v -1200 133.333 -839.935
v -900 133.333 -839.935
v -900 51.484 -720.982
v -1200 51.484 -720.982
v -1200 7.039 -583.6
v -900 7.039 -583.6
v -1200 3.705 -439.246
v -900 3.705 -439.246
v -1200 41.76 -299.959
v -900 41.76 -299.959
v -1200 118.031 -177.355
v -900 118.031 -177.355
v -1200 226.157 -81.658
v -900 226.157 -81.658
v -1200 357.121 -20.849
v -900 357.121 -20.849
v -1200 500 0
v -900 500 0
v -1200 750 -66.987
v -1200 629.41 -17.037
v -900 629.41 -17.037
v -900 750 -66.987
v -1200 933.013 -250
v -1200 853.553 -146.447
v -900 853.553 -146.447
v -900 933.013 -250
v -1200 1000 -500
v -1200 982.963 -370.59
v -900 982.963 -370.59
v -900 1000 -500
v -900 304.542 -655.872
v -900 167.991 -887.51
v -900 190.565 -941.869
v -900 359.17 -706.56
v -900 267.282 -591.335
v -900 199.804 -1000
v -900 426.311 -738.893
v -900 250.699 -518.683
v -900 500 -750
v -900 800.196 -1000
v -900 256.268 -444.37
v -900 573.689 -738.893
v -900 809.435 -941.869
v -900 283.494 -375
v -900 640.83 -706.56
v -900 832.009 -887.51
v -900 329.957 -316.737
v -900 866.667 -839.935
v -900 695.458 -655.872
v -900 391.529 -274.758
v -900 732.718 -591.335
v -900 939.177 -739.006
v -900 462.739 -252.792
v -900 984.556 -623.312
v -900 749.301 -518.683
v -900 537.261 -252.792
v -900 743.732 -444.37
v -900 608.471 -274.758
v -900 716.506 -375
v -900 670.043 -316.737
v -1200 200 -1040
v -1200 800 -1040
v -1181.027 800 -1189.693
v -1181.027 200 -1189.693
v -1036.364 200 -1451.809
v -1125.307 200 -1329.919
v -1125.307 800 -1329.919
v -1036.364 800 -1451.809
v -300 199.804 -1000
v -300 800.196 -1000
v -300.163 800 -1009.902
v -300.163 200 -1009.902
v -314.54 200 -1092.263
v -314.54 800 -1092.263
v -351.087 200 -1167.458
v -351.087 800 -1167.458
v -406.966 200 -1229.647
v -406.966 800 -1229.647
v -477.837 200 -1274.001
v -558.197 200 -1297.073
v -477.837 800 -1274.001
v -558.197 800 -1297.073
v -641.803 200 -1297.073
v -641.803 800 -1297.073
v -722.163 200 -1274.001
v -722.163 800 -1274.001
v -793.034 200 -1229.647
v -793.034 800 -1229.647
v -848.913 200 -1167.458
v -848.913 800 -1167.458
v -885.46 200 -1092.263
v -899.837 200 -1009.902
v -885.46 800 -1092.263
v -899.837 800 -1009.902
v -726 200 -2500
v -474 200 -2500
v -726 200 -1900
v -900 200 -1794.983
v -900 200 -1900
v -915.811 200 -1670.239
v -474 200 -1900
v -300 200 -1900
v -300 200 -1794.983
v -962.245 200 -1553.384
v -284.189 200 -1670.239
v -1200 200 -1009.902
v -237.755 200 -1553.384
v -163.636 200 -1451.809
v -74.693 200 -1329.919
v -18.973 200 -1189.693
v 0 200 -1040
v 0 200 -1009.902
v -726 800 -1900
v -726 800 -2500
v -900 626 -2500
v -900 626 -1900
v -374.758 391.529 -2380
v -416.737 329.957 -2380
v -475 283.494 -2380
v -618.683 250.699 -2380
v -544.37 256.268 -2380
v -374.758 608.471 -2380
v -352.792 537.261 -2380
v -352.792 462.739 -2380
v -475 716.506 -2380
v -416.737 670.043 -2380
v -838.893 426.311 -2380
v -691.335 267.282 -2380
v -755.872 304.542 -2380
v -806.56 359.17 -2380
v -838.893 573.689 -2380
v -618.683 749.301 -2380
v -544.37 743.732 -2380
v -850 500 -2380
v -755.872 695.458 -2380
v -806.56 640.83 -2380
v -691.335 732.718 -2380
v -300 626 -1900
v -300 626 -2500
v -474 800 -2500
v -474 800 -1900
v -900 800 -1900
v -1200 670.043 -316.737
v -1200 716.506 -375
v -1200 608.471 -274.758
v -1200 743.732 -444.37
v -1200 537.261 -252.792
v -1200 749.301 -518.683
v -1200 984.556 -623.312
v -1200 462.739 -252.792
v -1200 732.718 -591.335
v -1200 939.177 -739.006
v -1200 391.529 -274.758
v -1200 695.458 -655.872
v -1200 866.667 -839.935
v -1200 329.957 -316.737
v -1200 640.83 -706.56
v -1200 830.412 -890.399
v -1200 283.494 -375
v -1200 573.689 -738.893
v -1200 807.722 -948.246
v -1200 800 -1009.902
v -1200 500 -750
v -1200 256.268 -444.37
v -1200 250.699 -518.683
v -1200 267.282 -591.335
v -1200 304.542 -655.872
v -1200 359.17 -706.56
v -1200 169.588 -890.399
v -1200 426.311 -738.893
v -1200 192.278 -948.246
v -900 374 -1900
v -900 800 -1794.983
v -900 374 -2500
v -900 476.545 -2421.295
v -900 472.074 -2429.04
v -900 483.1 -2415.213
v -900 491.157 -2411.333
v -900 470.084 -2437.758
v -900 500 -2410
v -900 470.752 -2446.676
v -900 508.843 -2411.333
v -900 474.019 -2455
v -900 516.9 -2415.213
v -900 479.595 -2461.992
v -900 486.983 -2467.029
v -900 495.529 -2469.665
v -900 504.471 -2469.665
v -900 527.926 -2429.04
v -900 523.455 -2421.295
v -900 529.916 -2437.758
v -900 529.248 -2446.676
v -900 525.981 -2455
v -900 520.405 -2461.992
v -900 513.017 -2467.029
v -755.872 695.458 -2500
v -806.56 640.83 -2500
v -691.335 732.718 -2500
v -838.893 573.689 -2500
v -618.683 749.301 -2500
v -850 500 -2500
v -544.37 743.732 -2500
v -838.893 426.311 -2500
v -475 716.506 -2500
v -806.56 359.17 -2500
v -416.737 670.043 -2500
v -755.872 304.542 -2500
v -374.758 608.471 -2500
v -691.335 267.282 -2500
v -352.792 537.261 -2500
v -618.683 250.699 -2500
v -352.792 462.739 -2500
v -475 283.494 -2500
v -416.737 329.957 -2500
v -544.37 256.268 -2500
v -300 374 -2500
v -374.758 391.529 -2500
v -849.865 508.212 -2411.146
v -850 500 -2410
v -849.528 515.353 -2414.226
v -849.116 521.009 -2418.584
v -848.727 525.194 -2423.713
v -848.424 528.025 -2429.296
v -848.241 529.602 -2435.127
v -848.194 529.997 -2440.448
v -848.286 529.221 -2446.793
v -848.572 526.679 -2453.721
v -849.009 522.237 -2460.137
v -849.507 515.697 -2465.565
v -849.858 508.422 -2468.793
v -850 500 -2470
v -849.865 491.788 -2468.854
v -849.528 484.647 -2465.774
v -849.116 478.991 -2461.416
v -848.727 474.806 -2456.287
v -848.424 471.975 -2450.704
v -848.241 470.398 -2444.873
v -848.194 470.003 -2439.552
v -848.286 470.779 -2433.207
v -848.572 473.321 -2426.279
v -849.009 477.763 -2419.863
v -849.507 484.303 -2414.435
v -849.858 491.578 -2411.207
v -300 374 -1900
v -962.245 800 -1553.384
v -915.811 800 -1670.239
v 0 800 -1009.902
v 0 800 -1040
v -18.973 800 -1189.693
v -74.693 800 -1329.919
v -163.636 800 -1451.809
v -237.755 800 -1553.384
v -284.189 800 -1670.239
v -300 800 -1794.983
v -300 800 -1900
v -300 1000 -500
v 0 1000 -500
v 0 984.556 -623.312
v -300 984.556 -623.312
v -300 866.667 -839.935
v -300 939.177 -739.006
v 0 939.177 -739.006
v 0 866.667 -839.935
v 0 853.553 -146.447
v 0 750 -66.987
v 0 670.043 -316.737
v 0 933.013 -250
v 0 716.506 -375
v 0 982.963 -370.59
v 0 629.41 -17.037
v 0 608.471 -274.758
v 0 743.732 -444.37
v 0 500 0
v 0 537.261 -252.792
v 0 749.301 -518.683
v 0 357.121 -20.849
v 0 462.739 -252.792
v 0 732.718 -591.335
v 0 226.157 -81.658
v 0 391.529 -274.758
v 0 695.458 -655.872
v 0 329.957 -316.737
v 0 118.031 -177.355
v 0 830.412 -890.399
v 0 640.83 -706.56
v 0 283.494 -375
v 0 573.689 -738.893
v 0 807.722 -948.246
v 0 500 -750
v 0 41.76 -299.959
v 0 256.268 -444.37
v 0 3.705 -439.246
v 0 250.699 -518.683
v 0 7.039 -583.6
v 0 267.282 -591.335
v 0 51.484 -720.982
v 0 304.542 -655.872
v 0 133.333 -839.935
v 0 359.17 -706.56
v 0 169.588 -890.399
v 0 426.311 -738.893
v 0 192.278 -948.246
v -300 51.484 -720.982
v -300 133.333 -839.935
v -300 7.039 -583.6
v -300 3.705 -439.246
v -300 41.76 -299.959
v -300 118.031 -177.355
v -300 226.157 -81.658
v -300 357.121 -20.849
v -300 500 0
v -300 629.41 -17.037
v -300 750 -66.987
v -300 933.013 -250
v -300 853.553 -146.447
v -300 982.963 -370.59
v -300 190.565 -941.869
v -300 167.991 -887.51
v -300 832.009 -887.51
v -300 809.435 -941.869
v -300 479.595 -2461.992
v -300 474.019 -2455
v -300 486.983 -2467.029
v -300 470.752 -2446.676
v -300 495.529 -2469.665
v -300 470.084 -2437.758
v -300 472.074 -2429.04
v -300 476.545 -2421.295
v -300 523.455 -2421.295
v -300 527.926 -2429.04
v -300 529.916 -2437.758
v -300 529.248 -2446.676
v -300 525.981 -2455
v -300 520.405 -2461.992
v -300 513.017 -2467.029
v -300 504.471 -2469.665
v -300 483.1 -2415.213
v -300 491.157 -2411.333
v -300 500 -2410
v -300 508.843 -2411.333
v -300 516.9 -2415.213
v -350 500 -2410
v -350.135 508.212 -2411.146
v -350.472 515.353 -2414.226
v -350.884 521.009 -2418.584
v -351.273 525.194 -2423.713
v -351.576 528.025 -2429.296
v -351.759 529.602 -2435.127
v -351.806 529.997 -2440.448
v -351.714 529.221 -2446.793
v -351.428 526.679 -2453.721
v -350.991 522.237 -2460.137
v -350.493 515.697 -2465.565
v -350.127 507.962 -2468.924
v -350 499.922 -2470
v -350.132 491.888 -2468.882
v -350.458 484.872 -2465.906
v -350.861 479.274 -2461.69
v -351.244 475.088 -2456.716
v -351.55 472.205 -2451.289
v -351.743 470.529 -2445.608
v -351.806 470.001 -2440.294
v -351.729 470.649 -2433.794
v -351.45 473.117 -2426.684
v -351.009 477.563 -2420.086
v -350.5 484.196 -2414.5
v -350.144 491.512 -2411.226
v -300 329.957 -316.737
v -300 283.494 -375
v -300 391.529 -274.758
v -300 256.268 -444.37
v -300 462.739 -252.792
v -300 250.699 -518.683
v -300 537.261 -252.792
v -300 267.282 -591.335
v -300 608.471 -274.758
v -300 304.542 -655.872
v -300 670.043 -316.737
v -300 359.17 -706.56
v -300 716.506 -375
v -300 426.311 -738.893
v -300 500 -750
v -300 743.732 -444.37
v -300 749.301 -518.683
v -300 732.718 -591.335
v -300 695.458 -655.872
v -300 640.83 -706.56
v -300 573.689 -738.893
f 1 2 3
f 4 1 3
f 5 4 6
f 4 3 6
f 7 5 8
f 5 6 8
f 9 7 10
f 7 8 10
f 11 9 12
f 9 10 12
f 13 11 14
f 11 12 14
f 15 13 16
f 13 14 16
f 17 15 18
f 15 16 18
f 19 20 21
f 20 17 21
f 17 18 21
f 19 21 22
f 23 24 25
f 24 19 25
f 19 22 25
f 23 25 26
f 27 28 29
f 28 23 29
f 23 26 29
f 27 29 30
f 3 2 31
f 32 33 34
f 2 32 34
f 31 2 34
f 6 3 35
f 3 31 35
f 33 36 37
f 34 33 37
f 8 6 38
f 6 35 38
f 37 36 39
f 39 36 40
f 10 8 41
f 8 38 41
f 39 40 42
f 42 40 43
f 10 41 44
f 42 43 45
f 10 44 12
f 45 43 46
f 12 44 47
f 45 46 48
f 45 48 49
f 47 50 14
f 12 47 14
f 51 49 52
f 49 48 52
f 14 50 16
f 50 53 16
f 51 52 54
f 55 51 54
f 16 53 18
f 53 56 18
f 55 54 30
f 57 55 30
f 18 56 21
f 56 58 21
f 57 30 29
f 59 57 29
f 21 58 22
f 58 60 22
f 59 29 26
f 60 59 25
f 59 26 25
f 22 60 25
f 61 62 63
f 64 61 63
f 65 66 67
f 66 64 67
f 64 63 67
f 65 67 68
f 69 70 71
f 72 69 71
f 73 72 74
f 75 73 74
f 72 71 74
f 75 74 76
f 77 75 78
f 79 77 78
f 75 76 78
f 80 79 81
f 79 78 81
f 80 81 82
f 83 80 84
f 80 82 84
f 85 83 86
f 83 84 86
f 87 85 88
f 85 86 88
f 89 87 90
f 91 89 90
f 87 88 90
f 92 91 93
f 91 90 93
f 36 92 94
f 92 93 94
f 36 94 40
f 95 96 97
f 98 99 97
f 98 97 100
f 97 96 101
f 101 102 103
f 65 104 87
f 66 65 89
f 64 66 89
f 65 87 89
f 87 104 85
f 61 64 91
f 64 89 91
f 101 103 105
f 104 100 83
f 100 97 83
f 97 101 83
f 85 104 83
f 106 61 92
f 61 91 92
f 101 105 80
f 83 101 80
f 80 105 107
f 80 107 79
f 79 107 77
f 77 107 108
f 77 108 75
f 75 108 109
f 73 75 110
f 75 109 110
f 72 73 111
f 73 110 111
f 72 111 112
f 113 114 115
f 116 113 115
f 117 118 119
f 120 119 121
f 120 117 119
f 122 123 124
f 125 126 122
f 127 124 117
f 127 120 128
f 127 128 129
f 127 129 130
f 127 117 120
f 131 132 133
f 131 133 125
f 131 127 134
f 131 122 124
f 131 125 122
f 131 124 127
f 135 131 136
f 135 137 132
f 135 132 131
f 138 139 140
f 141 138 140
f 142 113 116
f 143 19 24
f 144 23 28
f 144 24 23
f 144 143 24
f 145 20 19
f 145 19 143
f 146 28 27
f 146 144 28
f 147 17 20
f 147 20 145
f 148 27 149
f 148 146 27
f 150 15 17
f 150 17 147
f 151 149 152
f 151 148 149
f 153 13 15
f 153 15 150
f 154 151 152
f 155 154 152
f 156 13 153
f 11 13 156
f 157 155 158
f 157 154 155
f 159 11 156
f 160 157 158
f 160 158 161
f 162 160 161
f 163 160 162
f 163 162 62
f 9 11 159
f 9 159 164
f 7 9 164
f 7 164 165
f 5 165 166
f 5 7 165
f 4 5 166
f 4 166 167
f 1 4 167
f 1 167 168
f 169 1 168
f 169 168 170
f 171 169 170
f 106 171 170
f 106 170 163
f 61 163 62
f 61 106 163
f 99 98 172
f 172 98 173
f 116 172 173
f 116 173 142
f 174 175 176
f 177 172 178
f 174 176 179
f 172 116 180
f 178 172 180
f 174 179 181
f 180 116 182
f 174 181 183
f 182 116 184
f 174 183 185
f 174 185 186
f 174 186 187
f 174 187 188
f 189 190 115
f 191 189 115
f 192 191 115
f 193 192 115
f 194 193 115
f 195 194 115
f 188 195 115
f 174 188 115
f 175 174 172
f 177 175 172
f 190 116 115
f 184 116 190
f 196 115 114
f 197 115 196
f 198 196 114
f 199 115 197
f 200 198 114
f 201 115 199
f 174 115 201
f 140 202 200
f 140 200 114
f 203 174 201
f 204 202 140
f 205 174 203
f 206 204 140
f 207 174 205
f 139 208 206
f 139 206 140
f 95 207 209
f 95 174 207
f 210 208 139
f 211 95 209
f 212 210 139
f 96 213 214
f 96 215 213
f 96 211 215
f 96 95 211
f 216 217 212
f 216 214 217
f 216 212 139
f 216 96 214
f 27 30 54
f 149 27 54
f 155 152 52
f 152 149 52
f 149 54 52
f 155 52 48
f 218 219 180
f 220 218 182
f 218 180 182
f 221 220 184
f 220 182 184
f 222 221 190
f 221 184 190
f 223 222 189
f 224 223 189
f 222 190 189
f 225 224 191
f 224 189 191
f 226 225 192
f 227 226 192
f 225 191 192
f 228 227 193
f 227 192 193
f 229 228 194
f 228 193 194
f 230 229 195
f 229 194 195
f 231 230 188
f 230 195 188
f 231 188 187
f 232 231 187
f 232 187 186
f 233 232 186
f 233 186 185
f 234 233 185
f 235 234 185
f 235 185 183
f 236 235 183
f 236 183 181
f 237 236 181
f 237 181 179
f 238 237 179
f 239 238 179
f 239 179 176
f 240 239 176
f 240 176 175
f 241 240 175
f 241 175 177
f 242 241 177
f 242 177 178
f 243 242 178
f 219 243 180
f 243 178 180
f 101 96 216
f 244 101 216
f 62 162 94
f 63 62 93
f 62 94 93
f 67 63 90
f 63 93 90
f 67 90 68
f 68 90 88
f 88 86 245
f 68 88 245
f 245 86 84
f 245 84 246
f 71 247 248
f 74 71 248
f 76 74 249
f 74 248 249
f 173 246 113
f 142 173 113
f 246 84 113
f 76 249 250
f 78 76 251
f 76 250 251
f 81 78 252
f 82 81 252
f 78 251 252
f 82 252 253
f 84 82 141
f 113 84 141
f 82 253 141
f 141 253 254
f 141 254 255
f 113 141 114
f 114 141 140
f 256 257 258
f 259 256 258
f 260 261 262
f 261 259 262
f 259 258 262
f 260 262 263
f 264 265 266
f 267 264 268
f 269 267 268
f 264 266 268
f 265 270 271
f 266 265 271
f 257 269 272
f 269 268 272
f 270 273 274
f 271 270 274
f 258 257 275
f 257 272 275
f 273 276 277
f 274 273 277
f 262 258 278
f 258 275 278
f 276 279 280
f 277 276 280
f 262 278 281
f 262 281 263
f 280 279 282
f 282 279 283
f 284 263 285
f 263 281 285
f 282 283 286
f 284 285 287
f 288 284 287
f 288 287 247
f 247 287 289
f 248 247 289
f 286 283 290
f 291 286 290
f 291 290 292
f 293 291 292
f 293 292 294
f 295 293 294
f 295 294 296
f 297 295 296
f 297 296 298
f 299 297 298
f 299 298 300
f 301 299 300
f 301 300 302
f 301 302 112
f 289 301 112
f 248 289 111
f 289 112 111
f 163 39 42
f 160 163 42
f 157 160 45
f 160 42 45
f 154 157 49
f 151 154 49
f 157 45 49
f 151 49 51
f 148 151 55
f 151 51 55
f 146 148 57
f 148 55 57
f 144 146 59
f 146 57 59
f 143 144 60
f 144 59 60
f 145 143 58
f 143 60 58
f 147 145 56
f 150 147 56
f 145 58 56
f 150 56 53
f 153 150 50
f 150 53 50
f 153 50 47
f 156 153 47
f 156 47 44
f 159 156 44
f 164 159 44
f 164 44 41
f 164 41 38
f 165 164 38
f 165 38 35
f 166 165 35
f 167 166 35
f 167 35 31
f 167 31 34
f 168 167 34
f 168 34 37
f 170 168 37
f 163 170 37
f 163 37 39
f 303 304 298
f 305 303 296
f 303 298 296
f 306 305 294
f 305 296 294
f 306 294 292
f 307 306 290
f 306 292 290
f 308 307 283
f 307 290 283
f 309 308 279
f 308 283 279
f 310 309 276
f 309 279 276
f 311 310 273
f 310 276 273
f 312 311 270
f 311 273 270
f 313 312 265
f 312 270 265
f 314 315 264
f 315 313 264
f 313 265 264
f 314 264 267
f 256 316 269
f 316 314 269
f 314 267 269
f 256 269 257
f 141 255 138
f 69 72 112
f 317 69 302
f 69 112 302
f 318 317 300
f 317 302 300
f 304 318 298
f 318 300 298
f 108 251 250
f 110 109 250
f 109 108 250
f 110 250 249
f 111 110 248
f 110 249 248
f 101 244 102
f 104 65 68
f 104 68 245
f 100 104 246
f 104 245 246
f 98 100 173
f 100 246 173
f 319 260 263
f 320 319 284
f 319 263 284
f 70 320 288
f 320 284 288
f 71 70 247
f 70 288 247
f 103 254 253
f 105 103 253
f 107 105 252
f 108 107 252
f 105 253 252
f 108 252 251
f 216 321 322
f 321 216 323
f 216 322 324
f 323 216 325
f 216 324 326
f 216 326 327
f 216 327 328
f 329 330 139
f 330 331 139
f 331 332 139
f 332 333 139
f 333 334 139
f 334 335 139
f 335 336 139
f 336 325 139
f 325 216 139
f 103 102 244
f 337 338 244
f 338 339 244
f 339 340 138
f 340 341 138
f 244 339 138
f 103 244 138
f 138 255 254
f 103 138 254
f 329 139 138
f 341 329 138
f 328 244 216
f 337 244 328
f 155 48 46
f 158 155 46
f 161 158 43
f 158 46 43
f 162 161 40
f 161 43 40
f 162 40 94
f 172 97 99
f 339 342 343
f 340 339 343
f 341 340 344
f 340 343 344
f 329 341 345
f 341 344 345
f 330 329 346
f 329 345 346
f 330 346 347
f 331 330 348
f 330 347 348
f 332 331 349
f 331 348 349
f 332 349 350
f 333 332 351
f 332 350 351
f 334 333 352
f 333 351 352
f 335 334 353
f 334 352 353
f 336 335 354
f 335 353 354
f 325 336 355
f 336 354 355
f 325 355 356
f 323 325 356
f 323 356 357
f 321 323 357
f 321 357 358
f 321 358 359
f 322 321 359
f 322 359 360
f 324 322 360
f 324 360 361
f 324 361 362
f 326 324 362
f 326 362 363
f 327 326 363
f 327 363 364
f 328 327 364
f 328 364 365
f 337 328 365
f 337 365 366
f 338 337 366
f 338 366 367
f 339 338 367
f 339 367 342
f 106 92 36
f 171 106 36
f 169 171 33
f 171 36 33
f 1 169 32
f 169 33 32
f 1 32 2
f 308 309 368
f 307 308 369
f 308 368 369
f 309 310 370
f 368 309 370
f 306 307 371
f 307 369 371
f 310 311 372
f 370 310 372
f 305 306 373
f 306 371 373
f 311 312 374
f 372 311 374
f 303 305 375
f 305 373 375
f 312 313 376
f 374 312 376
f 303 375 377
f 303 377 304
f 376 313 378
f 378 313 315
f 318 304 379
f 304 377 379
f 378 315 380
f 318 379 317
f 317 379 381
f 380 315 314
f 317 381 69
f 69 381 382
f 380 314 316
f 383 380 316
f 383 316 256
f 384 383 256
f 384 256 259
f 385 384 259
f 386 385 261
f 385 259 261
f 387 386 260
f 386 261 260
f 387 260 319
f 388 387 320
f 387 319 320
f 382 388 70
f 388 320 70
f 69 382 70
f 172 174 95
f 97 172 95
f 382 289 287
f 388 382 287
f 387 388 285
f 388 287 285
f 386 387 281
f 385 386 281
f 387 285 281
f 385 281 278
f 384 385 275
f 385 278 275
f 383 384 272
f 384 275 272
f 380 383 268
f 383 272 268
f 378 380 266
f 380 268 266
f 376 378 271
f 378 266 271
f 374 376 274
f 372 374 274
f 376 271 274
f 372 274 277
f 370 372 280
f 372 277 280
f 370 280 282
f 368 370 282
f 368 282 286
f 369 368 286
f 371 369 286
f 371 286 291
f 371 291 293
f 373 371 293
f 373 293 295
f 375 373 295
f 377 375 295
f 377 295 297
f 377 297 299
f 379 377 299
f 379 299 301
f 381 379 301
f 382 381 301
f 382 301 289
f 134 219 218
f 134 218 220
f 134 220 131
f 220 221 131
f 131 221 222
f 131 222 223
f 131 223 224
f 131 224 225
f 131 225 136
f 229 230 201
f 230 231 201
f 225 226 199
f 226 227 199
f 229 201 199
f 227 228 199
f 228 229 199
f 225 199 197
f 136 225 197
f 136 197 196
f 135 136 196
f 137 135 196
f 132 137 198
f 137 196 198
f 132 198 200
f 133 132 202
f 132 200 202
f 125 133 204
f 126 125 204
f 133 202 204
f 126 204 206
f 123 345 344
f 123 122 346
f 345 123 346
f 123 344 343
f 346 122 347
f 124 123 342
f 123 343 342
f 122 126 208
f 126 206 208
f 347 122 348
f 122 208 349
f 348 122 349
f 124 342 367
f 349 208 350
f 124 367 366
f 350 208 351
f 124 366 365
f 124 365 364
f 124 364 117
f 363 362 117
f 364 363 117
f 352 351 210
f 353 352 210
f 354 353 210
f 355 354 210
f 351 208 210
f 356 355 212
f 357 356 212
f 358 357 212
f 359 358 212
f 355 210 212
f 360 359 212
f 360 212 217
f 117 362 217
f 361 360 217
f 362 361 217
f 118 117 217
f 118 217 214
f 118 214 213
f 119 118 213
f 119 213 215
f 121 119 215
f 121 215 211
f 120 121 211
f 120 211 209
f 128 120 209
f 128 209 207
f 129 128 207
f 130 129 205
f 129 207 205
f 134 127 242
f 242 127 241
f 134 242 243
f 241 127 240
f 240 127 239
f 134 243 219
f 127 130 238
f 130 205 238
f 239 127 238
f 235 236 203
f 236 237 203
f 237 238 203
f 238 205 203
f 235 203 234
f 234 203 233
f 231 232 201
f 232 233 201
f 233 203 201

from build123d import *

# Parameters (mm, degrees)
SKETCH1_W           = 1200
SKETCH1_H           = 2500
BOSS_EXTRUDE1_DEPTH = 1000
CUT_EXTRUDE1_DEPTH  = 1000
CUT_EXTRUDE4_DEPTH  = 2948.880594597
CUT_EXTRUDE6_DEPTH  = 600
SKETCH6_R           = 250
CUT_EXTRUDE7_DEPTH  = 120
SKETCH7_R           = 30
CUT_EXTRUDE9_DEPTH  = 2840.013913347
SKETCH8_R           = 250
CUT_EXTRUDE10_DEPTH = 2948.880594722


with BuildPart() as part:
    # Sketch1 → Boss-Extrude1 (new body)
    with BuildSketch(Plane(origin=(0, 0, 0), x_dir=(1, 0, 0), z_dir=(0, 1, 0))):
        with Locations((-600, 1250)):
            Rectangle(SKETCH1_W, SKETCH1_H)
    extrude(amount=BOSS_EXTRUDE1_DEPTH)

    # Sketch2 → Cut-Extrude1 (cut)
    with BuildSketch(Plane(origin=(0, 1000, 0), x_dir=(1, 0, 0), z_dir=(0, 1, 0))):
        with BuildLine():
            Line((-900, 1794.983443527), (-900, 2500))
            Line((-900, 2500), (-1200, 2500))
            Line((-1200, 2500), (-1200, 1040))
            ThreePointArc((-1200, 1040), (-1157.592226371, 1261.564683763), (-1036.363636364, 1451.809151015))
            ThreePointArc((-1036.363636364, 1451.809151015), (-935.339811358, 1610.346207058), (-900, 1794.983443527))
        make_face()
        with BuildLine():
            Line((0, 2500), (-300, 2500))
            Line((-300, 2500), (-300, 1794.983443527))
            ThreePointArc((-300, 1794.983443527), (-264.660188642, 1610.346207058), (-163.636363636, 1451.809151015))
            ThreePointArc((-163.636363636, 1451.809151015), (-42.407773629, 1261.564683763), (0, 1040))
            Line((0, 1040), (0, 2500))
        make_face()
        with BuildLine():
            Line((-600, 0), (-600, 440))
            ThreePointArc((-600, 440), (-755.291427062, 460.444504227), (-900, 520.384757729))
            Line((-900, 520.384757729), (-900, 0))
            Line((-900, 0), (-600, 0))
        make_face()
        with BuildLine():
            Line((-600, 440), (-600, 700))
            ThreePointArc((-600, 700), (-812.132034356, 787.867965644), (-900, 1000))
            Line((-900, 1000), (-900, 520.384757729))
            ThreePointArc((-900, 520.384757729), (-755.291427062, 460.444504227), (-600, 440))
        make_face()
        with BuildLine():
            ThreePointArc((-300, 1000), (-387.867965644, 1212.132034356), (-600, 1300))
            Line((-600, 1300), (-600, 700))
            ThreePointArc((-600, 700), (-387.867965644, 787.867965644), (-300, 1000))
        make_face()
        with BuildLine():
            Line((-600, 700), (-600, 1300))
            ThreePointArc((-600, 1300), (-812.132034356, 1212.132034356), (-900, 1000))
            ThreePointArc((-900, 1000), (-812.132034356, 787.867965644), (-600, 700))
        make_face()
        with BuildLine():
            ThreePointArc((-300, 1000), (-387.867965644, 787.867965644), (-600, 700))
            Line((-600, 700), (-600, 440))
            ThreePointArc((-600, 440), (-444.708572938, 460.444504227), (-300, 520.384757729))
            Line((-300, 520.384757729), (-300, 1000))
        make_face()
        with BuildLine():
            ThreePointArc((-300, 520.384757729), (-444.708572938, 460.444504227), (-600, 440))
            Line((-600, 440), (-600, 0))
            Line((-600, 0), (-300, 0))
            Line((-300, 0), (-300, 520.384757729))
        make_face()
    extrude(amount=-CUT_EXTRUDE1_DEPTH, mode=Mode.SUBTRACT)

    # Sketch3 → Cut-Extrude4 (cut, through all)
    with BuildSketch(Plane(origin=(0, 0, 0), x_dir=(0, 0, -1), z_dir=(1, 0, 0))):
        with BuildLine():
            Line((500, 1000), (0, 1000))
            Line((0, 1000), (0, 499.999997907))
            ThreePointArc((0, 499.999997907), (146.446608667, 853.553389853), (500, 1000))
        make_face()
        with BuildLine():
            Line((1040, 1000), (500, 1000))
            ThreePointArc((500, 1000), (682.574185835, 965.474668126), (839.93463424, 866.666666667))
            ThreePointArc((839.93463424, 866.666666667), (918.614858442, 817.262665937), (1009.901951359, 800))
            Line((1009.901951359, 800), (1040, 800))
            Line((1040, 800), (1040, 1000))
        make_face()
        Polygon((1451.809151015, 1000), (1040, 1000), (1040, 800), (2500, 800), (2500, 1000), (1794.983443527, 1000), align=None)
        Polygon((1040, 200), (1040, 0), (1451.809151015, 0), (1794.983443527, 0), (2500, 0), (2500, 200), align=None)
        with BuildLine():
            ThreePointArc((839.93463424, 133.333333333), (682.574185835, 34.525331874), (500, 0))
            Line((500, 0), (1040, 0))
            Line((1040, 0), (1040, 200))
            Line((1040, 200), (1009.901951359, 200))
            ThreePointArc((1009.901951359, 200), (918.614858442, 182.737334063), (839.93463424, 133.333333333))
        make_face()
        with BuildLine():
            ThreePointArc((500, 0), (146.446610147, 146.446608667), (0, 499.999997907))
            Line((0, 499.999997907), (0, 0))
            Line((0, 0), (500, 0))
        make_face()
    extrude(amount=-CUT_EXTRUDE4_DEPTH, mode=Mode.SUBTRACT)

    # Sketch5 → Cut-Extrude6 (cut)
    with BuildSketch(Plane(origin=(0, 0, -2500), x_dir=(-1, 0, 0), z_dir=(0, 0, -1))):
        Polygon((300, 800), (300, 626), (474, 800), align=None)
        Polygon((900, 800), (813, 713), (900, 626), align=None)
        Polygon((900, 374), (726, 200), (900, 200), align=None)
        Polygon((387, 287), (300, 200), (474, 200), align=None)
        Polygon((300, 374), (300, 200), (387, 287), align=None)
        Polygon((726, 800), (813, 713), (900, 800), align=None)
    extrude(amount=-CUT_EXTRUDE6_DEPTH, mode=Mode.SUBTRACT)

    # Sketch6 → Cut-Extrude7 (cut)
    with BuildSketch(Plane(origin=(0, 0, -2500), x_dir=(-1, 0, 0), z_dir=(0, 0, -1))):
        with Locations((600, 500)):
            Circle(SKETCH6_R)
    extrude(amount=-CUT_EXTRUDE7_DEPTH, mode=Mode.SUBTRACT)

    # Sketch7 → Cut-Extrude9 (cut, through all)
    with BuildSketch(Plane.ZY.offset(900)):
        with Locations((-2440, 500)):
            Circle(SKETCH7_R)
    extrude(amount=-CUT_EXTRUDE9_DEPTH, mode=Mode.SUBTRACT)

    # Sketch8 → Cut-Extrude10 (cut, through all)
    with BuildSketch(Plane(origin=(0, 0, 0), x_dir=(0, 0, -1), z_dir=(1, 0, 0))):
        with Locations((500, 500)):
            Circle(SKETCH8_R)
    extrude(amount=-CUT_EXTRUDE10_DEPTH, mode=Mode.SUBTRACT)


solid = part.part
